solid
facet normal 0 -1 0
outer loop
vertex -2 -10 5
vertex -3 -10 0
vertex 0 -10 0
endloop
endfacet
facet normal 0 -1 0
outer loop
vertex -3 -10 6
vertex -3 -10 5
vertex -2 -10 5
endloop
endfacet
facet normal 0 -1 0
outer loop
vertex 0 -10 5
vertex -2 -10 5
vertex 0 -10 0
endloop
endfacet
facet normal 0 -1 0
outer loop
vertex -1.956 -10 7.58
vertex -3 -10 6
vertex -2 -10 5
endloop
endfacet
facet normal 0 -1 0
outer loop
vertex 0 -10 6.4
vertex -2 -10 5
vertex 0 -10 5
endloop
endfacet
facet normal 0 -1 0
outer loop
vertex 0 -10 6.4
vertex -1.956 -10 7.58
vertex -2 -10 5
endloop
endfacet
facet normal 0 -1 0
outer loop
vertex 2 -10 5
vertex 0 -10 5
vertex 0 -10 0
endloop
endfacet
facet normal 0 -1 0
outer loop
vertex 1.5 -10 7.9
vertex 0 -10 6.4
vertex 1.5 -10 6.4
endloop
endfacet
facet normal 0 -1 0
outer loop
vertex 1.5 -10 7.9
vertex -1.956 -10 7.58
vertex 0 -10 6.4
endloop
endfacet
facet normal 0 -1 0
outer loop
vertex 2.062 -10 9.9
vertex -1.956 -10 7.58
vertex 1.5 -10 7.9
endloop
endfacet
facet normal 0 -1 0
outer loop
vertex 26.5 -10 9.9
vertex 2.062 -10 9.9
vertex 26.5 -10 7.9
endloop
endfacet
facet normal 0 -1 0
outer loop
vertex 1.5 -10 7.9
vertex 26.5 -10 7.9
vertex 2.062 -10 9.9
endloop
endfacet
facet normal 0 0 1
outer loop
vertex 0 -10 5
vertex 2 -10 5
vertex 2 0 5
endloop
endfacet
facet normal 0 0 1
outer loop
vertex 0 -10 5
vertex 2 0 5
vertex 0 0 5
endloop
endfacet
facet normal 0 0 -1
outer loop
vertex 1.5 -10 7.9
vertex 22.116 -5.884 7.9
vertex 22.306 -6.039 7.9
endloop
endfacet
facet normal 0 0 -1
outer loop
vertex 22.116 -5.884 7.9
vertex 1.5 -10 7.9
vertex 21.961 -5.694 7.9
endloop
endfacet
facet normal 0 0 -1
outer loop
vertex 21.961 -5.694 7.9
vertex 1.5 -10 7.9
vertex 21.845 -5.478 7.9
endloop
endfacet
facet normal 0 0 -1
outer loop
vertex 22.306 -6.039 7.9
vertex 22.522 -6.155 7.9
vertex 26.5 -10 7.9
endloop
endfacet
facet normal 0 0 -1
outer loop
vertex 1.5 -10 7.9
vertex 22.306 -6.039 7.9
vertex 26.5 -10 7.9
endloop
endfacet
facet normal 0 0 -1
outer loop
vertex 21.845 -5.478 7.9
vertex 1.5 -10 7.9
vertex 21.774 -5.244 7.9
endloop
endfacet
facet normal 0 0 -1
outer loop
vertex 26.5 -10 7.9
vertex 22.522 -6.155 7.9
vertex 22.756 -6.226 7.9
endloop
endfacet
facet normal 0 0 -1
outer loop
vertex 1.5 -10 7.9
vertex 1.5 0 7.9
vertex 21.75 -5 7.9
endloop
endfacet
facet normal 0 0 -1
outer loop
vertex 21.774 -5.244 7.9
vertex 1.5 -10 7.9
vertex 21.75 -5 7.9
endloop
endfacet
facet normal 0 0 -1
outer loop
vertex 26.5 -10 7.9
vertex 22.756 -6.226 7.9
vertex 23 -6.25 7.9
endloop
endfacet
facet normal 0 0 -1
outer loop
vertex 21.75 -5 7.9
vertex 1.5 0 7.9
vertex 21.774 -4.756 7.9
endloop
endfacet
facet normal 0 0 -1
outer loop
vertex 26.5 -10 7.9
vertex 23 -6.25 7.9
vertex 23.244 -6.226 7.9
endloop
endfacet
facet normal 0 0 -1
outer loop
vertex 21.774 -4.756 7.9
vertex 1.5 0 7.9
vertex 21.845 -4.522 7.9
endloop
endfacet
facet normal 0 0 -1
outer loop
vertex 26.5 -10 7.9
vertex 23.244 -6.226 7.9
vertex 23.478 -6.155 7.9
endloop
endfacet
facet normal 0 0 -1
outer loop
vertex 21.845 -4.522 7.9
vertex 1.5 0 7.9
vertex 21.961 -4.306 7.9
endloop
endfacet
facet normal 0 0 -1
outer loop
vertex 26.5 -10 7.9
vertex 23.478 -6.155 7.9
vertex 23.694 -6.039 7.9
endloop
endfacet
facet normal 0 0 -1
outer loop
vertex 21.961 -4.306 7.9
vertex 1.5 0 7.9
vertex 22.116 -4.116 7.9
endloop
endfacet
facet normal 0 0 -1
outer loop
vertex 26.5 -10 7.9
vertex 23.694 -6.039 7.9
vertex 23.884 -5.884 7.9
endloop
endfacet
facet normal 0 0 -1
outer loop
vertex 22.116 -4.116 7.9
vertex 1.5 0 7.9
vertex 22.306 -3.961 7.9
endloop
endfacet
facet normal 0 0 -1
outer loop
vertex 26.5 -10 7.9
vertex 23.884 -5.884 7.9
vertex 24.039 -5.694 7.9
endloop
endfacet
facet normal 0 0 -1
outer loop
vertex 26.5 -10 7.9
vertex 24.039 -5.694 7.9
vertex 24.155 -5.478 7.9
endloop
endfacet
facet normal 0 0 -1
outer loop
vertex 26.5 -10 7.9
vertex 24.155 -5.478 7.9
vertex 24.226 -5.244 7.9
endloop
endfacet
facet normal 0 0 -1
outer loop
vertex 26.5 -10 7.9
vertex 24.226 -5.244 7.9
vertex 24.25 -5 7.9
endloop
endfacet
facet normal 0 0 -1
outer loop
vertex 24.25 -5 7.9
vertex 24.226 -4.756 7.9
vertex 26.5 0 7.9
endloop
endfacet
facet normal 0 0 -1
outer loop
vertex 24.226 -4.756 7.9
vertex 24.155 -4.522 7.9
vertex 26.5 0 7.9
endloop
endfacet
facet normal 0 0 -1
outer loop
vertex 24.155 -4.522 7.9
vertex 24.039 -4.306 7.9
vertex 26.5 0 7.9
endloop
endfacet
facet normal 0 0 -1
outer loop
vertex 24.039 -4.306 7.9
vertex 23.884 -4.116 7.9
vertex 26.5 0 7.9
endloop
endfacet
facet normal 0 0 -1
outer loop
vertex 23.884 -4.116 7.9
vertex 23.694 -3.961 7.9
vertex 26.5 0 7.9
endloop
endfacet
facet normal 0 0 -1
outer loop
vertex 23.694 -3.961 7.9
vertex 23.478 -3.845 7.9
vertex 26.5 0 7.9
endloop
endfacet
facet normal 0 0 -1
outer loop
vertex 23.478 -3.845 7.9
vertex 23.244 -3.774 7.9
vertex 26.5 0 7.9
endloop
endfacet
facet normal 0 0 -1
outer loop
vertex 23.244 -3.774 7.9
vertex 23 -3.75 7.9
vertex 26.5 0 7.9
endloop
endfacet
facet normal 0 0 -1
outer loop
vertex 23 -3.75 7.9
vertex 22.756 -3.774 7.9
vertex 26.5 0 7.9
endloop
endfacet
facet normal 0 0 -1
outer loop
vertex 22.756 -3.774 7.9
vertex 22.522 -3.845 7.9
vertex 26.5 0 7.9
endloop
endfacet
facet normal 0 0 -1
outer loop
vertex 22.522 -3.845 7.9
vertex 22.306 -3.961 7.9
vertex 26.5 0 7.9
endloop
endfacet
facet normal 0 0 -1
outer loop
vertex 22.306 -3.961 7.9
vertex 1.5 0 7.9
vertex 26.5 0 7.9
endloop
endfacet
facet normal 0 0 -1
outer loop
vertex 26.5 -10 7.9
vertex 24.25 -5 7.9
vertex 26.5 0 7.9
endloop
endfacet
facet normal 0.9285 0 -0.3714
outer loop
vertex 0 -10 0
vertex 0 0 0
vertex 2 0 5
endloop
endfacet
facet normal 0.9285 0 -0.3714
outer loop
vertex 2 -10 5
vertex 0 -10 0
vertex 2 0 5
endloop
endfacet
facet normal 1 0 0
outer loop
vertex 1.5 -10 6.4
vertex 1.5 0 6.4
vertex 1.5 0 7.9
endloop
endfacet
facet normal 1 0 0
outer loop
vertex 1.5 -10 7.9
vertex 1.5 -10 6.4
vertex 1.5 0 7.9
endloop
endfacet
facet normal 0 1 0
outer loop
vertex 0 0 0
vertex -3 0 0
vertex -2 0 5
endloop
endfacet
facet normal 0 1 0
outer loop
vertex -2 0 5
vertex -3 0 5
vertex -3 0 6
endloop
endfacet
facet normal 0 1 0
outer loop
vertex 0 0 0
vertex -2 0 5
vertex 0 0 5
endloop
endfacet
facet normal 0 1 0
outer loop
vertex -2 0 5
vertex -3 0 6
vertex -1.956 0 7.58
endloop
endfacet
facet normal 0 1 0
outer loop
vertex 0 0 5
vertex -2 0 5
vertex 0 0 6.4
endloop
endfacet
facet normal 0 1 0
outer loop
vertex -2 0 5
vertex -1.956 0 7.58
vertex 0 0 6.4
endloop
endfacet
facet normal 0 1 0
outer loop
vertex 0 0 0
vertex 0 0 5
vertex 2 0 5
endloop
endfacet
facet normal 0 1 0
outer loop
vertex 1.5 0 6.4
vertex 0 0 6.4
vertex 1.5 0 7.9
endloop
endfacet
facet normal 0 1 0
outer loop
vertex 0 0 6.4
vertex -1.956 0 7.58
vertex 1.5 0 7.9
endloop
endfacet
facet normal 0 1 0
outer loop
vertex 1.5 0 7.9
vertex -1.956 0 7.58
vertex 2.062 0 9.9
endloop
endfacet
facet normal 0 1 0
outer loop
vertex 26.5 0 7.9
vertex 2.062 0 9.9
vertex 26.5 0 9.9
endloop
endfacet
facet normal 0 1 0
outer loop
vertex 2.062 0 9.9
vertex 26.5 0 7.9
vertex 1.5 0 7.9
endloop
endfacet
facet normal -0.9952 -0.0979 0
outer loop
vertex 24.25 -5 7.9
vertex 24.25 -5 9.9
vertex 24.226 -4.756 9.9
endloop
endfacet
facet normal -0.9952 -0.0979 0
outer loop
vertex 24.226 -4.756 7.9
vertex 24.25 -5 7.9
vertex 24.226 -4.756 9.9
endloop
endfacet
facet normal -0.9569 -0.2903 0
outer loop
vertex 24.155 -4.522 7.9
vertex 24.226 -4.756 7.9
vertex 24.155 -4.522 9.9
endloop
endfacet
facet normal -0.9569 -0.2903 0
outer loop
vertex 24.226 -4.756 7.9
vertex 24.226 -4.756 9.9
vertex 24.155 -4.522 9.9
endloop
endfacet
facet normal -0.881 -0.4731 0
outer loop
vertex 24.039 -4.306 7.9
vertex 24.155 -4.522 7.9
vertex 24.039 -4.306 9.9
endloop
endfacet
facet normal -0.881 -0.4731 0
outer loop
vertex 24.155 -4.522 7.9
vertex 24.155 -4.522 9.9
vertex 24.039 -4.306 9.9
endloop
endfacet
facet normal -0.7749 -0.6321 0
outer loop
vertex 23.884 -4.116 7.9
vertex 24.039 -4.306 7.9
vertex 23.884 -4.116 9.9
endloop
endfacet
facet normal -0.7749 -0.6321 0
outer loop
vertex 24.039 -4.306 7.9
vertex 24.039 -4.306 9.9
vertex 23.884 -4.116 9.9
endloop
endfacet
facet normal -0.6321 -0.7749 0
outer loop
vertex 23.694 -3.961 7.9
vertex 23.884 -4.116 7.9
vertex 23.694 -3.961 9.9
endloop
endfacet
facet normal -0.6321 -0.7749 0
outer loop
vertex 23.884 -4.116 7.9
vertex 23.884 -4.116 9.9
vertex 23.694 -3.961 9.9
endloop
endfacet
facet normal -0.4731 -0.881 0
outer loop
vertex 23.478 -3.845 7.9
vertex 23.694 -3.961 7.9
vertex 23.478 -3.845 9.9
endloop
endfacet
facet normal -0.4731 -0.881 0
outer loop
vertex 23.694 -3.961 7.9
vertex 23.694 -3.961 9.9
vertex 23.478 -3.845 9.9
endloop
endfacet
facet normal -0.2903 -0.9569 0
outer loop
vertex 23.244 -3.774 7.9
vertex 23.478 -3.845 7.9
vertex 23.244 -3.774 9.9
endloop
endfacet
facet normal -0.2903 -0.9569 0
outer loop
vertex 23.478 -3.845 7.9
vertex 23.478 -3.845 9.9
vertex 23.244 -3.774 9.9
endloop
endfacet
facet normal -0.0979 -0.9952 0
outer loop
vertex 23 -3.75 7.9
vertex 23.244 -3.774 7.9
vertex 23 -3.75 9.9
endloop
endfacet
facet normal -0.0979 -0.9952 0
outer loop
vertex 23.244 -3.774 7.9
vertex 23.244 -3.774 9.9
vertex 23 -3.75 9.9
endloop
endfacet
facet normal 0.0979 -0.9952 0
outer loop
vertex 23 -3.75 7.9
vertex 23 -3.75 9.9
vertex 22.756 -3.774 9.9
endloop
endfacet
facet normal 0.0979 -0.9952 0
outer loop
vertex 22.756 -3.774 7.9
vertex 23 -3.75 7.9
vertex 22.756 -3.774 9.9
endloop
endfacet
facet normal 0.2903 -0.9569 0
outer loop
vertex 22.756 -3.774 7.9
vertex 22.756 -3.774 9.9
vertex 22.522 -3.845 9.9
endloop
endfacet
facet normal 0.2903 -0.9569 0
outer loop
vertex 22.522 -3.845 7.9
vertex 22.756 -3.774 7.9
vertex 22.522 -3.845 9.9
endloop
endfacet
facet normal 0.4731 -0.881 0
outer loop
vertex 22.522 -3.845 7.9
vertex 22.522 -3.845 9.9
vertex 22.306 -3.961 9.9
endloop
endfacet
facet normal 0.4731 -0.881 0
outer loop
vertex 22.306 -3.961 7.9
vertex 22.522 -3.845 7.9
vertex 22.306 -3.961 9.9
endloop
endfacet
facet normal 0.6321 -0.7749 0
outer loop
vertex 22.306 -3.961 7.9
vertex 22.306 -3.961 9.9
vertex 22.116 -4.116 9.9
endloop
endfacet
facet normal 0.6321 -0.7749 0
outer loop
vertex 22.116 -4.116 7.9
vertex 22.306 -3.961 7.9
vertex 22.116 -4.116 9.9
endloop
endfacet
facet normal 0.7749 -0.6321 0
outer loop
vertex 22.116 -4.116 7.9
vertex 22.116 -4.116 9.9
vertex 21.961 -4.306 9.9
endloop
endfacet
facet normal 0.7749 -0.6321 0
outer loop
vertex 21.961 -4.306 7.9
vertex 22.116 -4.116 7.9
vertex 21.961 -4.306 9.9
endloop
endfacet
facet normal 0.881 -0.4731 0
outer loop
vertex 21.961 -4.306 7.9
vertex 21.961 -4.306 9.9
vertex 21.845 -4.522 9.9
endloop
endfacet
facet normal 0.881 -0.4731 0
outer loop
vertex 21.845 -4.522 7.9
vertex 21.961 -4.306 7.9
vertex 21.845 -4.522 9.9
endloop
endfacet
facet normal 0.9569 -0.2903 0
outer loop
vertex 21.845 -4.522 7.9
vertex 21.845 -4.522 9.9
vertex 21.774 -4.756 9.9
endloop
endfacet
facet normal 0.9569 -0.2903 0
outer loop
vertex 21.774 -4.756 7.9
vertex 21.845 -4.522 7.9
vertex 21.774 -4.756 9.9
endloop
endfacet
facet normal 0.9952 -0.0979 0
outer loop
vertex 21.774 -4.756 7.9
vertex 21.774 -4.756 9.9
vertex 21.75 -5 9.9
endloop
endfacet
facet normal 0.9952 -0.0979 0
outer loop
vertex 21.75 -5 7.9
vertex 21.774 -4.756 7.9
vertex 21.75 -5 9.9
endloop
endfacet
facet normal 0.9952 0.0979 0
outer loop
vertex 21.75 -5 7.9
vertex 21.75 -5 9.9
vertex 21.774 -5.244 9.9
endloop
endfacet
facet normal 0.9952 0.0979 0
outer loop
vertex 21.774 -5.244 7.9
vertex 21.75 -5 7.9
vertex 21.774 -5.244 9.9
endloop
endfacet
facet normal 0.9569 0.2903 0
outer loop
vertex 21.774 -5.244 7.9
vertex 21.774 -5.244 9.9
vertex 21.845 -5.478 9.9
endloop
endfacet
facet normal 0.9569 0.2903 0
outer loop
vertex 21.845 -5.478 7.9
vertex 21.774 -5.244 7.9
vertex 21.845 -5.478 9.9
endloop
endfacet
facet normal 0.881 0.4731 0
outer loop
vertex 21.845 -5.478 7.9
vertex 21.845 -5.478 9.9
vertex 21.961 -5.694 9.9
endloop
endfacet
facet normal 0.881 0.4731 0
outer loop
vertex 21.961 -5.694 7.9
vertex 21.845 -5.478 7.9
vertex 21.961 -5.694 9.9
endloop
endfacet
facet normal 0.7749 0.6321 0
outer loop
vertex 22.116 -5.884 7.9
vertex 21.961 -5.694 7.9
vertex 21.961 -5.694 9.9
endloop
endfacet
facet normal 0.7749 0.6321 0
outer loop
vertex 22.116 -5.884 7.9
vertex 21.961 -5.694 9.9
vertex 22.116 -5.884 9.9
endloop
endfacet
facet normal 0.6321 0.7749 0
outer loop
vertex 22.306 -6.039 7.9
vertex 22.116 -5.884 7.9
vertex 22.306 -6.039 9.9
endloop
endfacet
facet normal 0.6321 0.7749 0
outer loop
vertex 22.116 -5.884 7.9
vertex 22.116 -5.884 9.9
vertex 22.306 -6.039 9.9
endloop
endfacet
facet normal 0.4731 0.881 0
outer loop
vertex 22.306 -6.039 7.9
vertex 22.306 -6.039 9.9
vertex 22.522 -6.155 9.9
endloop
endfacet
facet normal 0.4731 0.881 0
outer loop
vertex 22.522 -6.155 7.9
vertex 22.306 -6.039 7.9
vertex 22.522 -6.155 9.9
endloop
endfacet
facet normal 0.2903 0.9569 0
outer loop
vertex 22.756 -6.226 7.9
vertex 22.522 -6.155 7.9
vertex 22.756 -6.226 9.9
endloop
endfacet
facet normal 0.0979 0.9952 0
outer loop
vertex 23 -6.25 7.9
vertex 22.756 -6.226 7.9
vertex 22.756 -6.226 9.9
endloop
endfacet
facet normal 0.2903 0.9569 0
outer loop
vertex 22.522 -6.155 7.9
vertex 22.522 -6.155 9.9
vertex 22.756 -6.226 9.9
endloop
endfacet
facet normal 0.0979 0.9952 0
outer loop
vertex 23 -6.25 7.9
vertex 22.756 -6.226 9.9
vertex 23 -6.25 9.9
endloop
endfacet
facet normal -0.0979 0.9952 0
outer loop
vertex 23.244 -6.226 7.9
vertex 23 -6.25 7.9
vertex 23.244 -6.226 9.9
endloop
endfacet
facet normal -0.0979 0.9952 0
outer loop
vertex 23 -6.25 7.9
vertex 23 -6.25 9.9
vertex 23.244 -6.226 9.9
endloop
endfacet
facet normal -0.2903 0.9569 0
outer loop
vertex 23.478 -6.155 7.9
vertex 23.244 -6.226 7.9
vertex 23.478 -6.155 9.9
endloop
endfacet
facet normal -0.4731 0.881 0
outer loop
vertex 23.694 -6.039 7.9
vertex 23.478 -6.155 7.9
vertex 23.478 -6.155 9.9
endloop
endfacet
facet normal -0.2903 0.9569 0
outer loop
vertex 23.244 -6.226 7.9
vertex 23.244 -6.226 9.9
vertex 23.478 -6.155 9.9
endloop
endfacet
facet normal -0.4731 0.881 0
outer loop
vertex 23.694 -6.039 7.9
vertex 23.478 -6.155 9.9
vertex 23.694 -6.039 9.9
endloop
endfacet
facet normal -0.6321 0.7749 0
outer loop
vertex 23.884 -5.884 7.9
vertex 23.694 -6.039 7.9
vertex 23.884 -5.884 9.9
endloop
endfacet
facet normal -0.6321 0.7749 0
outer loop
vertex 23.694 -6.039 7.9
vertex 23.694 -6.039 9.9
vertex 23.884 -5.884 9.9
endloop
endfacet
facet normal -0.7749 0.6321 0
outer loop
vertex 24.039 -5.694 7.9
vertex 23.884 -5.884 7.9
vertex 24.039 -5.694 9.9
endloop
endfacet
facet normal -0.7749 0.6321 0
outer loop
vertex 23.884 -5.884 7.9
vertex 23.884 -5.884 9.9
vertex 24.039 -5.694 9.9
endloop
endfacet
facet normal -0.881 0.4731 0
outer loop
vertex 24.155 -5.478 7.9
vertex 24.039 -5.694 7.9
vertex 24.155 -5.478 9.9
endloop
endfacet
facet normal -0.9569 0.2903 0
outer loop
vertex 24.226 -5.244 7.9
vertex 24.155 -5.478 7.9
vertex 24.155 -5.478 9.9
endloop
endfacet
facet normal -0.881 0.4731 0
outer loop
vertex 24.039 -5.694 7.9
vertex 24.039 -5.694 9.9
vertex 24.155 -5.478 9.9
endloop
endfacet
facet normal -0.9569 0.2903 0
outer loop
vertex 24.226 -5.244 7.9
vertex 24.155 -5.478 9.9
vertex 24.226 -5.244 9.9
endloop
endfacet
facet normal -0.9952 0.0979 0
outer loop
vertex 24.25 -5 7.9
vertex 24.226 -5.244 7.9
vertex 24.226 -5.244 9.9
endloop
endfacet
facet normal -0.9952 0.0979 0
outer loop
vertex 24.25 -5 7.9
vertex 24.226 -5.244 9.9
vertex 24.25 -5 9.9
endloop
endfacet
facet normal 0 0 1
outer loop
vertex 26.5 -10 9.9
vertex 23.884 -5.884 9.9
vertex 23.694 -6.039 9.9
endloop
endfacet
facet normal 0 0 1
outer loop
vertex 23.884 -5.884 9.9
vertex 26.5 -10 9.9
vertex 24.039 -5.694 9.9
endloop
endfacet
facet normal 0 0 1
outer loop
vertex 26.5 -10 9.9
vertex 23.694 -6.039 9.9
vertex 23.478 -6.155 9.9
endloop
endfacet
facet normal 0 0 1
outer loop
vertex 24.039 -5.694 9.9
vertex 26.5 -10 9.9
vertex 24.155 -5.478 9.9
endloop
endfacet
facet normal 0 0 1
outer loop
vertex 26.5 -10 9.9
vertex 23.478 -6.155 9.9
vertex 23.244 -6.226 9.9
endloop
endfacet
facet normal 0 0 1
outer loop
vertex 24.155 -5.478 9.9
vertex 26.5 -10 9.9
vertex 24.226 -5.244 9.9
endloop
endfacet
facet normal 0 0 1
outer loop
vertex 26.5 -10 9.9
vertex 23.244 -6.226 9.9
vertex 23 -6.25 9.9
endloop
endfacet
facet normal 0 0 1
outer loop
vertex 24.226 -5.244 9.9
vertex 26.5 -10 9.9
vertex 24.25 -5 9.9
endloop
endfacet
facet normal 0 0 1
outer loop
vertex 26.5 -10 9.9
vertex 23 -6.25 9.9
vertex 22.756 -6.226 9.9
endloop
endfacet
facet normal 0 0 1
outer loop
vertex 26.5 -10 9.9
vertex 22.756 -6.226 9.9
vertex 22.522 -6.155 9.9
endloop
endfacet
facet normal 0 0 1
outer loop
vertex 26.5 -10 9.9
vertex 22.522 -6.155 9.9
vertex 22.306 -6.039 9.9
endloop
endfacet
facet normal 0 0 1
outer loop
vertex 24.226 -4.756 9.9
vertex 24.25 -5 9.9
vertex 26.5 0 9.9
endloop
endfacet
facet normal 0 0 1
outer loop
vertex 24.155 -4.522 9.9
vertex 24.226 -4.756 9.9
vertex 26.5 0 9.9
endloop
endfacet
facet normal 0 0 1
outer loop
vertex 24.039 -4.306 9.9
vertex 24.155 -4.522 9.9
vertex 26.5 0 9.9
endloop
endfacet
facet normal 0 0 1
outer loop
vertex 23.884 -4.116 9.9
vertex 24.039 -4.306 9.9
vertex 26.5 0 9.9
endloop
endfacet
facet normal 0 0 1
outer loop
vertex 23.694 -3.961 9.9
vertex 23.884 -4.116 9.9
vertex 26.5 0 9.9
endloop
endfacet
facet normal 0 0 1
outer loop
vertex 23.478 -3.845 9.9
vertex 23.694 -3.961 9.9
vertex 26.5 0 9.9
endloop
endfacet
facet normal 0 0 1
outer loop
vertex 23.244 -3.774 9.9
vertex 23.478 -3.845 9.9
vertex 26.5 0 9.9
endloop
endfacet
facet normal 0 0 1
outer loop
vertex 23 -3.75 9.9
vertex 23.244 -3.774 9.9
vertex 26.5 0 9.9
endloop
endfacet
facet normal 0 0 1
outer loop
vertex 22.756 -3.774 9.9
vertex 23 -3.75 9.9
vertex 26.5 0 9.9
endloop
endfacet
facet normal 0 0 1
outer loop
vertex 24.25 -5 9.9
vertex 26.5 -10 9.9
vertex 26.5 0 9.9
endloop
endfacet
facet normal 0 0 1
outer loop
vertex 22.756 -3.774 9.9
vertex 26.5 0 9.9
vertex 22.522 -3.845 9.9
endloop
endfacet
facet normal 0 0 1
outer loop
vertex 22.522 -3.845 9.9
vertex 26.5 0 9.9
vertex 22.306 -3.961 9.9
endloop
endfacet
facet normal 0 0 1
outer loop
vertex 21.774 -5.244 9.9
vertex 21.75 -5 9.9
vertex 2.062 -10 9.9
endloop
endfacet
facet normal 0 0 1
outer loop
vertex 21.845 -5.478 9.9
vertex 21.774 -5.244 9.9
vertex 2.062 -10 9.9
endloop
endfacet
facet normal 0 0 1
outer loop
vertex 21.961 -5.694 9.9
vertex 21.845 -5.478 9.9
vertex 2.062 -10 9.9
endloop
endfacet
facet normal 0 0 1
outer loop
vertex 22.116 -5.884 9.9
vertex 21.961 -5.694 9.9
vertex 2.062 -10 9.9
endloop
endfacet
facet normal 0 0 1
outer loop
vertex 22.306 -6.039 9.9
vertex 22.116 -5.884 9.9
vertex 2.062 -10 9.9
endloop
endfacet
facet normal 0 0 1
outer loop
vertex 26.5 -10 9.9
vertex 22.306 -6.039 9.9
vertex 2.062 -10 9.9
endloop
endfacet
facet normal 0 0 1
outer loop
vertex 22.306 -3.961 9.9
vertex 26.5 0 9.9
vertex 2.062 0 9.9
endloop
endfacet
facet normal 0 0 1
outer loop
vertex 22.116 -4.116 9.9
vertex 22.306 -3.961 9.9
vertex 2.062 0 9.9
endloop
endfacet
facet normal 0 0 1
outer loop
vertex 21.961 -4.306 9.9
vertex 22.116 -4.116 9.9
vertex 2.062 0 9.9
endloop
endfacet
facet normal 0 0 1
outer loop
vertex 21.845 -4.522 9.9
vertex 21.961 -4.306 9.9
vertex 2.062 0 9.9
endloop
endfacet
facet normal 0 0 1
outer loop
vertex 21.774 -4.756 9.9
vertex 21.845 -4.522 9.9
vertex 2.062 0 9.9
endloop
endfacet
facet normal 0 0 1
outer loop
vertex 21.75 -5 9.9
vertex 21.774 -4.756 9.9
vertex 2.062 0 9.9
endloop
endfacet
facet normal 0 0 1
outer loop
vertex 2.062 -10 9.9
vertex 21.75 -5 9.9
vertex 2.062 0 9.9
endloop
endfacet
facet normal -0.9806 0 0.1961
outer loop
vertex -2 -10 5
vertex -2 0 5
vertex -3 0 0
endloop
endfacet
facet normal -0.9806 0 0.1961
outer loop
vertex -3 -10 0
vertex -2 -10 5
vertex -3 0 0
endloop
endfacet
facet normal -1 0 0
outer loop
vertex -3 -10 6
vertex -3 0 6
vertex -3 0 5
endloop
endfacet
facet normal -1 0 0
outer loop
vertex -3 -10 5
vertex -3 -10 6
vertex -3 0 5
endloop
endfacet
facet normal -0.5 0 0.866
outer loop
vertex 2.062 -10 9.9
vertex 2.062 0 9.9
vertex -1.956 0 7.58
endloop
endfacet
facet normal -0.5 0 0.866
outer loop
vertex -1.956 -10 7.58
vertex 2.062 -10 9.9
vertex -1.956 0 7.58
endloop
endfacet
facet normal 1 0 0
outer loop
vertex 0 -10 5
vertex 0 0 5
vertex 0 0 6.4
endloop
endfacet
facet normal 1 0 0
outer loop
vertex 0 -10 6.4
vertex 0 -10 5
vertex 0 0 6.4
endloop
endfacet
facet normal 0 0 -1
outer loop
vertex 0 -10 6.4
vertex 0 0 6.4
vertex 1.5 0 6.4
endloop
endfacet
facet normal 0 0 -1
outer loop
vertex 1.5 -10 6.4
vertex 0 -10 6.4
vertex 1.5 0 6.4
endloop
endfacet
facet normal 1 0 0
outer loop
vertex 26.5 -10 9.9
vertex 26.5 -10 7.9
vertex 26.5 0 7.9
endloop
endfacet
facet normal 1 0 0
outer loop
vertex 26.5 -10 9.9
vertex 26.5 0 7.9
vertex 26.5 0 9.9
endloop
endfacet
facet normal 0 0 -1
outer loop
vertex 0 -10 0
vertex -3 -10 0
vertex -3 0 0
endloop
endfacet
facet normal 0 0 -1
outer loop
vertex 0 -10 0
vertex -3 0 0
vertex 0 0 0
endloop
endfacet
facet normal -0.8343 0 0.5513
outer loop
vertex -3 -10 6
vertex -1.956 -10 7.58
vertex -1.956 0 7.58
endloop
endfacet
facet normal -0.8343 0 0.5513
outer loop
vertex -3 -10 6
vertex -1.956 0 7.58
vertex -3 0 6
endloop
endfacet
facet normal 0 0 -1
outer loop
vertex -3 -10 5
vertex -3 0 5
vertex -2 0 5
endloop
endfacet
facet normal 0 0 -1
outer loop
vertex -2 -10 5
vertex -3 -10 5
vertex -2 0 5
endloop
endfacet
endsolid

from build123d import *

# Parameters (mm, degrees)
F1_DEPTH = 10
F2_R     = 1.25
F3_DEPTH = 25


with BuildPart() as f1:
    # F0 (on Front) → F1 (new body)
    with BuildSketch(Plane.XZ):
        Polygon((-3, 0), (0, 0), (2, 5), (0, 5), (0, 6.4), (1.5, 6.4), (1.5, 7.9), (26.5, 7.9), (26.5, 9.9), (2.062178, 9.9), (-1.955755, 7.580245), (-3, 6), (-3, 5), (-2, 5), align=None)
    extrude(amount=F1_DEPTH)

    # F2 (on face) → F3 (cut)
    with BuildSketch(Plane.XY.offset(9.9)):
        with Locations((23, -5)):
            Circle(F2_R)
    extrude(amount=-F3_DEPTH, mode=Mode.SUBTRACT)


solid = f1.part
